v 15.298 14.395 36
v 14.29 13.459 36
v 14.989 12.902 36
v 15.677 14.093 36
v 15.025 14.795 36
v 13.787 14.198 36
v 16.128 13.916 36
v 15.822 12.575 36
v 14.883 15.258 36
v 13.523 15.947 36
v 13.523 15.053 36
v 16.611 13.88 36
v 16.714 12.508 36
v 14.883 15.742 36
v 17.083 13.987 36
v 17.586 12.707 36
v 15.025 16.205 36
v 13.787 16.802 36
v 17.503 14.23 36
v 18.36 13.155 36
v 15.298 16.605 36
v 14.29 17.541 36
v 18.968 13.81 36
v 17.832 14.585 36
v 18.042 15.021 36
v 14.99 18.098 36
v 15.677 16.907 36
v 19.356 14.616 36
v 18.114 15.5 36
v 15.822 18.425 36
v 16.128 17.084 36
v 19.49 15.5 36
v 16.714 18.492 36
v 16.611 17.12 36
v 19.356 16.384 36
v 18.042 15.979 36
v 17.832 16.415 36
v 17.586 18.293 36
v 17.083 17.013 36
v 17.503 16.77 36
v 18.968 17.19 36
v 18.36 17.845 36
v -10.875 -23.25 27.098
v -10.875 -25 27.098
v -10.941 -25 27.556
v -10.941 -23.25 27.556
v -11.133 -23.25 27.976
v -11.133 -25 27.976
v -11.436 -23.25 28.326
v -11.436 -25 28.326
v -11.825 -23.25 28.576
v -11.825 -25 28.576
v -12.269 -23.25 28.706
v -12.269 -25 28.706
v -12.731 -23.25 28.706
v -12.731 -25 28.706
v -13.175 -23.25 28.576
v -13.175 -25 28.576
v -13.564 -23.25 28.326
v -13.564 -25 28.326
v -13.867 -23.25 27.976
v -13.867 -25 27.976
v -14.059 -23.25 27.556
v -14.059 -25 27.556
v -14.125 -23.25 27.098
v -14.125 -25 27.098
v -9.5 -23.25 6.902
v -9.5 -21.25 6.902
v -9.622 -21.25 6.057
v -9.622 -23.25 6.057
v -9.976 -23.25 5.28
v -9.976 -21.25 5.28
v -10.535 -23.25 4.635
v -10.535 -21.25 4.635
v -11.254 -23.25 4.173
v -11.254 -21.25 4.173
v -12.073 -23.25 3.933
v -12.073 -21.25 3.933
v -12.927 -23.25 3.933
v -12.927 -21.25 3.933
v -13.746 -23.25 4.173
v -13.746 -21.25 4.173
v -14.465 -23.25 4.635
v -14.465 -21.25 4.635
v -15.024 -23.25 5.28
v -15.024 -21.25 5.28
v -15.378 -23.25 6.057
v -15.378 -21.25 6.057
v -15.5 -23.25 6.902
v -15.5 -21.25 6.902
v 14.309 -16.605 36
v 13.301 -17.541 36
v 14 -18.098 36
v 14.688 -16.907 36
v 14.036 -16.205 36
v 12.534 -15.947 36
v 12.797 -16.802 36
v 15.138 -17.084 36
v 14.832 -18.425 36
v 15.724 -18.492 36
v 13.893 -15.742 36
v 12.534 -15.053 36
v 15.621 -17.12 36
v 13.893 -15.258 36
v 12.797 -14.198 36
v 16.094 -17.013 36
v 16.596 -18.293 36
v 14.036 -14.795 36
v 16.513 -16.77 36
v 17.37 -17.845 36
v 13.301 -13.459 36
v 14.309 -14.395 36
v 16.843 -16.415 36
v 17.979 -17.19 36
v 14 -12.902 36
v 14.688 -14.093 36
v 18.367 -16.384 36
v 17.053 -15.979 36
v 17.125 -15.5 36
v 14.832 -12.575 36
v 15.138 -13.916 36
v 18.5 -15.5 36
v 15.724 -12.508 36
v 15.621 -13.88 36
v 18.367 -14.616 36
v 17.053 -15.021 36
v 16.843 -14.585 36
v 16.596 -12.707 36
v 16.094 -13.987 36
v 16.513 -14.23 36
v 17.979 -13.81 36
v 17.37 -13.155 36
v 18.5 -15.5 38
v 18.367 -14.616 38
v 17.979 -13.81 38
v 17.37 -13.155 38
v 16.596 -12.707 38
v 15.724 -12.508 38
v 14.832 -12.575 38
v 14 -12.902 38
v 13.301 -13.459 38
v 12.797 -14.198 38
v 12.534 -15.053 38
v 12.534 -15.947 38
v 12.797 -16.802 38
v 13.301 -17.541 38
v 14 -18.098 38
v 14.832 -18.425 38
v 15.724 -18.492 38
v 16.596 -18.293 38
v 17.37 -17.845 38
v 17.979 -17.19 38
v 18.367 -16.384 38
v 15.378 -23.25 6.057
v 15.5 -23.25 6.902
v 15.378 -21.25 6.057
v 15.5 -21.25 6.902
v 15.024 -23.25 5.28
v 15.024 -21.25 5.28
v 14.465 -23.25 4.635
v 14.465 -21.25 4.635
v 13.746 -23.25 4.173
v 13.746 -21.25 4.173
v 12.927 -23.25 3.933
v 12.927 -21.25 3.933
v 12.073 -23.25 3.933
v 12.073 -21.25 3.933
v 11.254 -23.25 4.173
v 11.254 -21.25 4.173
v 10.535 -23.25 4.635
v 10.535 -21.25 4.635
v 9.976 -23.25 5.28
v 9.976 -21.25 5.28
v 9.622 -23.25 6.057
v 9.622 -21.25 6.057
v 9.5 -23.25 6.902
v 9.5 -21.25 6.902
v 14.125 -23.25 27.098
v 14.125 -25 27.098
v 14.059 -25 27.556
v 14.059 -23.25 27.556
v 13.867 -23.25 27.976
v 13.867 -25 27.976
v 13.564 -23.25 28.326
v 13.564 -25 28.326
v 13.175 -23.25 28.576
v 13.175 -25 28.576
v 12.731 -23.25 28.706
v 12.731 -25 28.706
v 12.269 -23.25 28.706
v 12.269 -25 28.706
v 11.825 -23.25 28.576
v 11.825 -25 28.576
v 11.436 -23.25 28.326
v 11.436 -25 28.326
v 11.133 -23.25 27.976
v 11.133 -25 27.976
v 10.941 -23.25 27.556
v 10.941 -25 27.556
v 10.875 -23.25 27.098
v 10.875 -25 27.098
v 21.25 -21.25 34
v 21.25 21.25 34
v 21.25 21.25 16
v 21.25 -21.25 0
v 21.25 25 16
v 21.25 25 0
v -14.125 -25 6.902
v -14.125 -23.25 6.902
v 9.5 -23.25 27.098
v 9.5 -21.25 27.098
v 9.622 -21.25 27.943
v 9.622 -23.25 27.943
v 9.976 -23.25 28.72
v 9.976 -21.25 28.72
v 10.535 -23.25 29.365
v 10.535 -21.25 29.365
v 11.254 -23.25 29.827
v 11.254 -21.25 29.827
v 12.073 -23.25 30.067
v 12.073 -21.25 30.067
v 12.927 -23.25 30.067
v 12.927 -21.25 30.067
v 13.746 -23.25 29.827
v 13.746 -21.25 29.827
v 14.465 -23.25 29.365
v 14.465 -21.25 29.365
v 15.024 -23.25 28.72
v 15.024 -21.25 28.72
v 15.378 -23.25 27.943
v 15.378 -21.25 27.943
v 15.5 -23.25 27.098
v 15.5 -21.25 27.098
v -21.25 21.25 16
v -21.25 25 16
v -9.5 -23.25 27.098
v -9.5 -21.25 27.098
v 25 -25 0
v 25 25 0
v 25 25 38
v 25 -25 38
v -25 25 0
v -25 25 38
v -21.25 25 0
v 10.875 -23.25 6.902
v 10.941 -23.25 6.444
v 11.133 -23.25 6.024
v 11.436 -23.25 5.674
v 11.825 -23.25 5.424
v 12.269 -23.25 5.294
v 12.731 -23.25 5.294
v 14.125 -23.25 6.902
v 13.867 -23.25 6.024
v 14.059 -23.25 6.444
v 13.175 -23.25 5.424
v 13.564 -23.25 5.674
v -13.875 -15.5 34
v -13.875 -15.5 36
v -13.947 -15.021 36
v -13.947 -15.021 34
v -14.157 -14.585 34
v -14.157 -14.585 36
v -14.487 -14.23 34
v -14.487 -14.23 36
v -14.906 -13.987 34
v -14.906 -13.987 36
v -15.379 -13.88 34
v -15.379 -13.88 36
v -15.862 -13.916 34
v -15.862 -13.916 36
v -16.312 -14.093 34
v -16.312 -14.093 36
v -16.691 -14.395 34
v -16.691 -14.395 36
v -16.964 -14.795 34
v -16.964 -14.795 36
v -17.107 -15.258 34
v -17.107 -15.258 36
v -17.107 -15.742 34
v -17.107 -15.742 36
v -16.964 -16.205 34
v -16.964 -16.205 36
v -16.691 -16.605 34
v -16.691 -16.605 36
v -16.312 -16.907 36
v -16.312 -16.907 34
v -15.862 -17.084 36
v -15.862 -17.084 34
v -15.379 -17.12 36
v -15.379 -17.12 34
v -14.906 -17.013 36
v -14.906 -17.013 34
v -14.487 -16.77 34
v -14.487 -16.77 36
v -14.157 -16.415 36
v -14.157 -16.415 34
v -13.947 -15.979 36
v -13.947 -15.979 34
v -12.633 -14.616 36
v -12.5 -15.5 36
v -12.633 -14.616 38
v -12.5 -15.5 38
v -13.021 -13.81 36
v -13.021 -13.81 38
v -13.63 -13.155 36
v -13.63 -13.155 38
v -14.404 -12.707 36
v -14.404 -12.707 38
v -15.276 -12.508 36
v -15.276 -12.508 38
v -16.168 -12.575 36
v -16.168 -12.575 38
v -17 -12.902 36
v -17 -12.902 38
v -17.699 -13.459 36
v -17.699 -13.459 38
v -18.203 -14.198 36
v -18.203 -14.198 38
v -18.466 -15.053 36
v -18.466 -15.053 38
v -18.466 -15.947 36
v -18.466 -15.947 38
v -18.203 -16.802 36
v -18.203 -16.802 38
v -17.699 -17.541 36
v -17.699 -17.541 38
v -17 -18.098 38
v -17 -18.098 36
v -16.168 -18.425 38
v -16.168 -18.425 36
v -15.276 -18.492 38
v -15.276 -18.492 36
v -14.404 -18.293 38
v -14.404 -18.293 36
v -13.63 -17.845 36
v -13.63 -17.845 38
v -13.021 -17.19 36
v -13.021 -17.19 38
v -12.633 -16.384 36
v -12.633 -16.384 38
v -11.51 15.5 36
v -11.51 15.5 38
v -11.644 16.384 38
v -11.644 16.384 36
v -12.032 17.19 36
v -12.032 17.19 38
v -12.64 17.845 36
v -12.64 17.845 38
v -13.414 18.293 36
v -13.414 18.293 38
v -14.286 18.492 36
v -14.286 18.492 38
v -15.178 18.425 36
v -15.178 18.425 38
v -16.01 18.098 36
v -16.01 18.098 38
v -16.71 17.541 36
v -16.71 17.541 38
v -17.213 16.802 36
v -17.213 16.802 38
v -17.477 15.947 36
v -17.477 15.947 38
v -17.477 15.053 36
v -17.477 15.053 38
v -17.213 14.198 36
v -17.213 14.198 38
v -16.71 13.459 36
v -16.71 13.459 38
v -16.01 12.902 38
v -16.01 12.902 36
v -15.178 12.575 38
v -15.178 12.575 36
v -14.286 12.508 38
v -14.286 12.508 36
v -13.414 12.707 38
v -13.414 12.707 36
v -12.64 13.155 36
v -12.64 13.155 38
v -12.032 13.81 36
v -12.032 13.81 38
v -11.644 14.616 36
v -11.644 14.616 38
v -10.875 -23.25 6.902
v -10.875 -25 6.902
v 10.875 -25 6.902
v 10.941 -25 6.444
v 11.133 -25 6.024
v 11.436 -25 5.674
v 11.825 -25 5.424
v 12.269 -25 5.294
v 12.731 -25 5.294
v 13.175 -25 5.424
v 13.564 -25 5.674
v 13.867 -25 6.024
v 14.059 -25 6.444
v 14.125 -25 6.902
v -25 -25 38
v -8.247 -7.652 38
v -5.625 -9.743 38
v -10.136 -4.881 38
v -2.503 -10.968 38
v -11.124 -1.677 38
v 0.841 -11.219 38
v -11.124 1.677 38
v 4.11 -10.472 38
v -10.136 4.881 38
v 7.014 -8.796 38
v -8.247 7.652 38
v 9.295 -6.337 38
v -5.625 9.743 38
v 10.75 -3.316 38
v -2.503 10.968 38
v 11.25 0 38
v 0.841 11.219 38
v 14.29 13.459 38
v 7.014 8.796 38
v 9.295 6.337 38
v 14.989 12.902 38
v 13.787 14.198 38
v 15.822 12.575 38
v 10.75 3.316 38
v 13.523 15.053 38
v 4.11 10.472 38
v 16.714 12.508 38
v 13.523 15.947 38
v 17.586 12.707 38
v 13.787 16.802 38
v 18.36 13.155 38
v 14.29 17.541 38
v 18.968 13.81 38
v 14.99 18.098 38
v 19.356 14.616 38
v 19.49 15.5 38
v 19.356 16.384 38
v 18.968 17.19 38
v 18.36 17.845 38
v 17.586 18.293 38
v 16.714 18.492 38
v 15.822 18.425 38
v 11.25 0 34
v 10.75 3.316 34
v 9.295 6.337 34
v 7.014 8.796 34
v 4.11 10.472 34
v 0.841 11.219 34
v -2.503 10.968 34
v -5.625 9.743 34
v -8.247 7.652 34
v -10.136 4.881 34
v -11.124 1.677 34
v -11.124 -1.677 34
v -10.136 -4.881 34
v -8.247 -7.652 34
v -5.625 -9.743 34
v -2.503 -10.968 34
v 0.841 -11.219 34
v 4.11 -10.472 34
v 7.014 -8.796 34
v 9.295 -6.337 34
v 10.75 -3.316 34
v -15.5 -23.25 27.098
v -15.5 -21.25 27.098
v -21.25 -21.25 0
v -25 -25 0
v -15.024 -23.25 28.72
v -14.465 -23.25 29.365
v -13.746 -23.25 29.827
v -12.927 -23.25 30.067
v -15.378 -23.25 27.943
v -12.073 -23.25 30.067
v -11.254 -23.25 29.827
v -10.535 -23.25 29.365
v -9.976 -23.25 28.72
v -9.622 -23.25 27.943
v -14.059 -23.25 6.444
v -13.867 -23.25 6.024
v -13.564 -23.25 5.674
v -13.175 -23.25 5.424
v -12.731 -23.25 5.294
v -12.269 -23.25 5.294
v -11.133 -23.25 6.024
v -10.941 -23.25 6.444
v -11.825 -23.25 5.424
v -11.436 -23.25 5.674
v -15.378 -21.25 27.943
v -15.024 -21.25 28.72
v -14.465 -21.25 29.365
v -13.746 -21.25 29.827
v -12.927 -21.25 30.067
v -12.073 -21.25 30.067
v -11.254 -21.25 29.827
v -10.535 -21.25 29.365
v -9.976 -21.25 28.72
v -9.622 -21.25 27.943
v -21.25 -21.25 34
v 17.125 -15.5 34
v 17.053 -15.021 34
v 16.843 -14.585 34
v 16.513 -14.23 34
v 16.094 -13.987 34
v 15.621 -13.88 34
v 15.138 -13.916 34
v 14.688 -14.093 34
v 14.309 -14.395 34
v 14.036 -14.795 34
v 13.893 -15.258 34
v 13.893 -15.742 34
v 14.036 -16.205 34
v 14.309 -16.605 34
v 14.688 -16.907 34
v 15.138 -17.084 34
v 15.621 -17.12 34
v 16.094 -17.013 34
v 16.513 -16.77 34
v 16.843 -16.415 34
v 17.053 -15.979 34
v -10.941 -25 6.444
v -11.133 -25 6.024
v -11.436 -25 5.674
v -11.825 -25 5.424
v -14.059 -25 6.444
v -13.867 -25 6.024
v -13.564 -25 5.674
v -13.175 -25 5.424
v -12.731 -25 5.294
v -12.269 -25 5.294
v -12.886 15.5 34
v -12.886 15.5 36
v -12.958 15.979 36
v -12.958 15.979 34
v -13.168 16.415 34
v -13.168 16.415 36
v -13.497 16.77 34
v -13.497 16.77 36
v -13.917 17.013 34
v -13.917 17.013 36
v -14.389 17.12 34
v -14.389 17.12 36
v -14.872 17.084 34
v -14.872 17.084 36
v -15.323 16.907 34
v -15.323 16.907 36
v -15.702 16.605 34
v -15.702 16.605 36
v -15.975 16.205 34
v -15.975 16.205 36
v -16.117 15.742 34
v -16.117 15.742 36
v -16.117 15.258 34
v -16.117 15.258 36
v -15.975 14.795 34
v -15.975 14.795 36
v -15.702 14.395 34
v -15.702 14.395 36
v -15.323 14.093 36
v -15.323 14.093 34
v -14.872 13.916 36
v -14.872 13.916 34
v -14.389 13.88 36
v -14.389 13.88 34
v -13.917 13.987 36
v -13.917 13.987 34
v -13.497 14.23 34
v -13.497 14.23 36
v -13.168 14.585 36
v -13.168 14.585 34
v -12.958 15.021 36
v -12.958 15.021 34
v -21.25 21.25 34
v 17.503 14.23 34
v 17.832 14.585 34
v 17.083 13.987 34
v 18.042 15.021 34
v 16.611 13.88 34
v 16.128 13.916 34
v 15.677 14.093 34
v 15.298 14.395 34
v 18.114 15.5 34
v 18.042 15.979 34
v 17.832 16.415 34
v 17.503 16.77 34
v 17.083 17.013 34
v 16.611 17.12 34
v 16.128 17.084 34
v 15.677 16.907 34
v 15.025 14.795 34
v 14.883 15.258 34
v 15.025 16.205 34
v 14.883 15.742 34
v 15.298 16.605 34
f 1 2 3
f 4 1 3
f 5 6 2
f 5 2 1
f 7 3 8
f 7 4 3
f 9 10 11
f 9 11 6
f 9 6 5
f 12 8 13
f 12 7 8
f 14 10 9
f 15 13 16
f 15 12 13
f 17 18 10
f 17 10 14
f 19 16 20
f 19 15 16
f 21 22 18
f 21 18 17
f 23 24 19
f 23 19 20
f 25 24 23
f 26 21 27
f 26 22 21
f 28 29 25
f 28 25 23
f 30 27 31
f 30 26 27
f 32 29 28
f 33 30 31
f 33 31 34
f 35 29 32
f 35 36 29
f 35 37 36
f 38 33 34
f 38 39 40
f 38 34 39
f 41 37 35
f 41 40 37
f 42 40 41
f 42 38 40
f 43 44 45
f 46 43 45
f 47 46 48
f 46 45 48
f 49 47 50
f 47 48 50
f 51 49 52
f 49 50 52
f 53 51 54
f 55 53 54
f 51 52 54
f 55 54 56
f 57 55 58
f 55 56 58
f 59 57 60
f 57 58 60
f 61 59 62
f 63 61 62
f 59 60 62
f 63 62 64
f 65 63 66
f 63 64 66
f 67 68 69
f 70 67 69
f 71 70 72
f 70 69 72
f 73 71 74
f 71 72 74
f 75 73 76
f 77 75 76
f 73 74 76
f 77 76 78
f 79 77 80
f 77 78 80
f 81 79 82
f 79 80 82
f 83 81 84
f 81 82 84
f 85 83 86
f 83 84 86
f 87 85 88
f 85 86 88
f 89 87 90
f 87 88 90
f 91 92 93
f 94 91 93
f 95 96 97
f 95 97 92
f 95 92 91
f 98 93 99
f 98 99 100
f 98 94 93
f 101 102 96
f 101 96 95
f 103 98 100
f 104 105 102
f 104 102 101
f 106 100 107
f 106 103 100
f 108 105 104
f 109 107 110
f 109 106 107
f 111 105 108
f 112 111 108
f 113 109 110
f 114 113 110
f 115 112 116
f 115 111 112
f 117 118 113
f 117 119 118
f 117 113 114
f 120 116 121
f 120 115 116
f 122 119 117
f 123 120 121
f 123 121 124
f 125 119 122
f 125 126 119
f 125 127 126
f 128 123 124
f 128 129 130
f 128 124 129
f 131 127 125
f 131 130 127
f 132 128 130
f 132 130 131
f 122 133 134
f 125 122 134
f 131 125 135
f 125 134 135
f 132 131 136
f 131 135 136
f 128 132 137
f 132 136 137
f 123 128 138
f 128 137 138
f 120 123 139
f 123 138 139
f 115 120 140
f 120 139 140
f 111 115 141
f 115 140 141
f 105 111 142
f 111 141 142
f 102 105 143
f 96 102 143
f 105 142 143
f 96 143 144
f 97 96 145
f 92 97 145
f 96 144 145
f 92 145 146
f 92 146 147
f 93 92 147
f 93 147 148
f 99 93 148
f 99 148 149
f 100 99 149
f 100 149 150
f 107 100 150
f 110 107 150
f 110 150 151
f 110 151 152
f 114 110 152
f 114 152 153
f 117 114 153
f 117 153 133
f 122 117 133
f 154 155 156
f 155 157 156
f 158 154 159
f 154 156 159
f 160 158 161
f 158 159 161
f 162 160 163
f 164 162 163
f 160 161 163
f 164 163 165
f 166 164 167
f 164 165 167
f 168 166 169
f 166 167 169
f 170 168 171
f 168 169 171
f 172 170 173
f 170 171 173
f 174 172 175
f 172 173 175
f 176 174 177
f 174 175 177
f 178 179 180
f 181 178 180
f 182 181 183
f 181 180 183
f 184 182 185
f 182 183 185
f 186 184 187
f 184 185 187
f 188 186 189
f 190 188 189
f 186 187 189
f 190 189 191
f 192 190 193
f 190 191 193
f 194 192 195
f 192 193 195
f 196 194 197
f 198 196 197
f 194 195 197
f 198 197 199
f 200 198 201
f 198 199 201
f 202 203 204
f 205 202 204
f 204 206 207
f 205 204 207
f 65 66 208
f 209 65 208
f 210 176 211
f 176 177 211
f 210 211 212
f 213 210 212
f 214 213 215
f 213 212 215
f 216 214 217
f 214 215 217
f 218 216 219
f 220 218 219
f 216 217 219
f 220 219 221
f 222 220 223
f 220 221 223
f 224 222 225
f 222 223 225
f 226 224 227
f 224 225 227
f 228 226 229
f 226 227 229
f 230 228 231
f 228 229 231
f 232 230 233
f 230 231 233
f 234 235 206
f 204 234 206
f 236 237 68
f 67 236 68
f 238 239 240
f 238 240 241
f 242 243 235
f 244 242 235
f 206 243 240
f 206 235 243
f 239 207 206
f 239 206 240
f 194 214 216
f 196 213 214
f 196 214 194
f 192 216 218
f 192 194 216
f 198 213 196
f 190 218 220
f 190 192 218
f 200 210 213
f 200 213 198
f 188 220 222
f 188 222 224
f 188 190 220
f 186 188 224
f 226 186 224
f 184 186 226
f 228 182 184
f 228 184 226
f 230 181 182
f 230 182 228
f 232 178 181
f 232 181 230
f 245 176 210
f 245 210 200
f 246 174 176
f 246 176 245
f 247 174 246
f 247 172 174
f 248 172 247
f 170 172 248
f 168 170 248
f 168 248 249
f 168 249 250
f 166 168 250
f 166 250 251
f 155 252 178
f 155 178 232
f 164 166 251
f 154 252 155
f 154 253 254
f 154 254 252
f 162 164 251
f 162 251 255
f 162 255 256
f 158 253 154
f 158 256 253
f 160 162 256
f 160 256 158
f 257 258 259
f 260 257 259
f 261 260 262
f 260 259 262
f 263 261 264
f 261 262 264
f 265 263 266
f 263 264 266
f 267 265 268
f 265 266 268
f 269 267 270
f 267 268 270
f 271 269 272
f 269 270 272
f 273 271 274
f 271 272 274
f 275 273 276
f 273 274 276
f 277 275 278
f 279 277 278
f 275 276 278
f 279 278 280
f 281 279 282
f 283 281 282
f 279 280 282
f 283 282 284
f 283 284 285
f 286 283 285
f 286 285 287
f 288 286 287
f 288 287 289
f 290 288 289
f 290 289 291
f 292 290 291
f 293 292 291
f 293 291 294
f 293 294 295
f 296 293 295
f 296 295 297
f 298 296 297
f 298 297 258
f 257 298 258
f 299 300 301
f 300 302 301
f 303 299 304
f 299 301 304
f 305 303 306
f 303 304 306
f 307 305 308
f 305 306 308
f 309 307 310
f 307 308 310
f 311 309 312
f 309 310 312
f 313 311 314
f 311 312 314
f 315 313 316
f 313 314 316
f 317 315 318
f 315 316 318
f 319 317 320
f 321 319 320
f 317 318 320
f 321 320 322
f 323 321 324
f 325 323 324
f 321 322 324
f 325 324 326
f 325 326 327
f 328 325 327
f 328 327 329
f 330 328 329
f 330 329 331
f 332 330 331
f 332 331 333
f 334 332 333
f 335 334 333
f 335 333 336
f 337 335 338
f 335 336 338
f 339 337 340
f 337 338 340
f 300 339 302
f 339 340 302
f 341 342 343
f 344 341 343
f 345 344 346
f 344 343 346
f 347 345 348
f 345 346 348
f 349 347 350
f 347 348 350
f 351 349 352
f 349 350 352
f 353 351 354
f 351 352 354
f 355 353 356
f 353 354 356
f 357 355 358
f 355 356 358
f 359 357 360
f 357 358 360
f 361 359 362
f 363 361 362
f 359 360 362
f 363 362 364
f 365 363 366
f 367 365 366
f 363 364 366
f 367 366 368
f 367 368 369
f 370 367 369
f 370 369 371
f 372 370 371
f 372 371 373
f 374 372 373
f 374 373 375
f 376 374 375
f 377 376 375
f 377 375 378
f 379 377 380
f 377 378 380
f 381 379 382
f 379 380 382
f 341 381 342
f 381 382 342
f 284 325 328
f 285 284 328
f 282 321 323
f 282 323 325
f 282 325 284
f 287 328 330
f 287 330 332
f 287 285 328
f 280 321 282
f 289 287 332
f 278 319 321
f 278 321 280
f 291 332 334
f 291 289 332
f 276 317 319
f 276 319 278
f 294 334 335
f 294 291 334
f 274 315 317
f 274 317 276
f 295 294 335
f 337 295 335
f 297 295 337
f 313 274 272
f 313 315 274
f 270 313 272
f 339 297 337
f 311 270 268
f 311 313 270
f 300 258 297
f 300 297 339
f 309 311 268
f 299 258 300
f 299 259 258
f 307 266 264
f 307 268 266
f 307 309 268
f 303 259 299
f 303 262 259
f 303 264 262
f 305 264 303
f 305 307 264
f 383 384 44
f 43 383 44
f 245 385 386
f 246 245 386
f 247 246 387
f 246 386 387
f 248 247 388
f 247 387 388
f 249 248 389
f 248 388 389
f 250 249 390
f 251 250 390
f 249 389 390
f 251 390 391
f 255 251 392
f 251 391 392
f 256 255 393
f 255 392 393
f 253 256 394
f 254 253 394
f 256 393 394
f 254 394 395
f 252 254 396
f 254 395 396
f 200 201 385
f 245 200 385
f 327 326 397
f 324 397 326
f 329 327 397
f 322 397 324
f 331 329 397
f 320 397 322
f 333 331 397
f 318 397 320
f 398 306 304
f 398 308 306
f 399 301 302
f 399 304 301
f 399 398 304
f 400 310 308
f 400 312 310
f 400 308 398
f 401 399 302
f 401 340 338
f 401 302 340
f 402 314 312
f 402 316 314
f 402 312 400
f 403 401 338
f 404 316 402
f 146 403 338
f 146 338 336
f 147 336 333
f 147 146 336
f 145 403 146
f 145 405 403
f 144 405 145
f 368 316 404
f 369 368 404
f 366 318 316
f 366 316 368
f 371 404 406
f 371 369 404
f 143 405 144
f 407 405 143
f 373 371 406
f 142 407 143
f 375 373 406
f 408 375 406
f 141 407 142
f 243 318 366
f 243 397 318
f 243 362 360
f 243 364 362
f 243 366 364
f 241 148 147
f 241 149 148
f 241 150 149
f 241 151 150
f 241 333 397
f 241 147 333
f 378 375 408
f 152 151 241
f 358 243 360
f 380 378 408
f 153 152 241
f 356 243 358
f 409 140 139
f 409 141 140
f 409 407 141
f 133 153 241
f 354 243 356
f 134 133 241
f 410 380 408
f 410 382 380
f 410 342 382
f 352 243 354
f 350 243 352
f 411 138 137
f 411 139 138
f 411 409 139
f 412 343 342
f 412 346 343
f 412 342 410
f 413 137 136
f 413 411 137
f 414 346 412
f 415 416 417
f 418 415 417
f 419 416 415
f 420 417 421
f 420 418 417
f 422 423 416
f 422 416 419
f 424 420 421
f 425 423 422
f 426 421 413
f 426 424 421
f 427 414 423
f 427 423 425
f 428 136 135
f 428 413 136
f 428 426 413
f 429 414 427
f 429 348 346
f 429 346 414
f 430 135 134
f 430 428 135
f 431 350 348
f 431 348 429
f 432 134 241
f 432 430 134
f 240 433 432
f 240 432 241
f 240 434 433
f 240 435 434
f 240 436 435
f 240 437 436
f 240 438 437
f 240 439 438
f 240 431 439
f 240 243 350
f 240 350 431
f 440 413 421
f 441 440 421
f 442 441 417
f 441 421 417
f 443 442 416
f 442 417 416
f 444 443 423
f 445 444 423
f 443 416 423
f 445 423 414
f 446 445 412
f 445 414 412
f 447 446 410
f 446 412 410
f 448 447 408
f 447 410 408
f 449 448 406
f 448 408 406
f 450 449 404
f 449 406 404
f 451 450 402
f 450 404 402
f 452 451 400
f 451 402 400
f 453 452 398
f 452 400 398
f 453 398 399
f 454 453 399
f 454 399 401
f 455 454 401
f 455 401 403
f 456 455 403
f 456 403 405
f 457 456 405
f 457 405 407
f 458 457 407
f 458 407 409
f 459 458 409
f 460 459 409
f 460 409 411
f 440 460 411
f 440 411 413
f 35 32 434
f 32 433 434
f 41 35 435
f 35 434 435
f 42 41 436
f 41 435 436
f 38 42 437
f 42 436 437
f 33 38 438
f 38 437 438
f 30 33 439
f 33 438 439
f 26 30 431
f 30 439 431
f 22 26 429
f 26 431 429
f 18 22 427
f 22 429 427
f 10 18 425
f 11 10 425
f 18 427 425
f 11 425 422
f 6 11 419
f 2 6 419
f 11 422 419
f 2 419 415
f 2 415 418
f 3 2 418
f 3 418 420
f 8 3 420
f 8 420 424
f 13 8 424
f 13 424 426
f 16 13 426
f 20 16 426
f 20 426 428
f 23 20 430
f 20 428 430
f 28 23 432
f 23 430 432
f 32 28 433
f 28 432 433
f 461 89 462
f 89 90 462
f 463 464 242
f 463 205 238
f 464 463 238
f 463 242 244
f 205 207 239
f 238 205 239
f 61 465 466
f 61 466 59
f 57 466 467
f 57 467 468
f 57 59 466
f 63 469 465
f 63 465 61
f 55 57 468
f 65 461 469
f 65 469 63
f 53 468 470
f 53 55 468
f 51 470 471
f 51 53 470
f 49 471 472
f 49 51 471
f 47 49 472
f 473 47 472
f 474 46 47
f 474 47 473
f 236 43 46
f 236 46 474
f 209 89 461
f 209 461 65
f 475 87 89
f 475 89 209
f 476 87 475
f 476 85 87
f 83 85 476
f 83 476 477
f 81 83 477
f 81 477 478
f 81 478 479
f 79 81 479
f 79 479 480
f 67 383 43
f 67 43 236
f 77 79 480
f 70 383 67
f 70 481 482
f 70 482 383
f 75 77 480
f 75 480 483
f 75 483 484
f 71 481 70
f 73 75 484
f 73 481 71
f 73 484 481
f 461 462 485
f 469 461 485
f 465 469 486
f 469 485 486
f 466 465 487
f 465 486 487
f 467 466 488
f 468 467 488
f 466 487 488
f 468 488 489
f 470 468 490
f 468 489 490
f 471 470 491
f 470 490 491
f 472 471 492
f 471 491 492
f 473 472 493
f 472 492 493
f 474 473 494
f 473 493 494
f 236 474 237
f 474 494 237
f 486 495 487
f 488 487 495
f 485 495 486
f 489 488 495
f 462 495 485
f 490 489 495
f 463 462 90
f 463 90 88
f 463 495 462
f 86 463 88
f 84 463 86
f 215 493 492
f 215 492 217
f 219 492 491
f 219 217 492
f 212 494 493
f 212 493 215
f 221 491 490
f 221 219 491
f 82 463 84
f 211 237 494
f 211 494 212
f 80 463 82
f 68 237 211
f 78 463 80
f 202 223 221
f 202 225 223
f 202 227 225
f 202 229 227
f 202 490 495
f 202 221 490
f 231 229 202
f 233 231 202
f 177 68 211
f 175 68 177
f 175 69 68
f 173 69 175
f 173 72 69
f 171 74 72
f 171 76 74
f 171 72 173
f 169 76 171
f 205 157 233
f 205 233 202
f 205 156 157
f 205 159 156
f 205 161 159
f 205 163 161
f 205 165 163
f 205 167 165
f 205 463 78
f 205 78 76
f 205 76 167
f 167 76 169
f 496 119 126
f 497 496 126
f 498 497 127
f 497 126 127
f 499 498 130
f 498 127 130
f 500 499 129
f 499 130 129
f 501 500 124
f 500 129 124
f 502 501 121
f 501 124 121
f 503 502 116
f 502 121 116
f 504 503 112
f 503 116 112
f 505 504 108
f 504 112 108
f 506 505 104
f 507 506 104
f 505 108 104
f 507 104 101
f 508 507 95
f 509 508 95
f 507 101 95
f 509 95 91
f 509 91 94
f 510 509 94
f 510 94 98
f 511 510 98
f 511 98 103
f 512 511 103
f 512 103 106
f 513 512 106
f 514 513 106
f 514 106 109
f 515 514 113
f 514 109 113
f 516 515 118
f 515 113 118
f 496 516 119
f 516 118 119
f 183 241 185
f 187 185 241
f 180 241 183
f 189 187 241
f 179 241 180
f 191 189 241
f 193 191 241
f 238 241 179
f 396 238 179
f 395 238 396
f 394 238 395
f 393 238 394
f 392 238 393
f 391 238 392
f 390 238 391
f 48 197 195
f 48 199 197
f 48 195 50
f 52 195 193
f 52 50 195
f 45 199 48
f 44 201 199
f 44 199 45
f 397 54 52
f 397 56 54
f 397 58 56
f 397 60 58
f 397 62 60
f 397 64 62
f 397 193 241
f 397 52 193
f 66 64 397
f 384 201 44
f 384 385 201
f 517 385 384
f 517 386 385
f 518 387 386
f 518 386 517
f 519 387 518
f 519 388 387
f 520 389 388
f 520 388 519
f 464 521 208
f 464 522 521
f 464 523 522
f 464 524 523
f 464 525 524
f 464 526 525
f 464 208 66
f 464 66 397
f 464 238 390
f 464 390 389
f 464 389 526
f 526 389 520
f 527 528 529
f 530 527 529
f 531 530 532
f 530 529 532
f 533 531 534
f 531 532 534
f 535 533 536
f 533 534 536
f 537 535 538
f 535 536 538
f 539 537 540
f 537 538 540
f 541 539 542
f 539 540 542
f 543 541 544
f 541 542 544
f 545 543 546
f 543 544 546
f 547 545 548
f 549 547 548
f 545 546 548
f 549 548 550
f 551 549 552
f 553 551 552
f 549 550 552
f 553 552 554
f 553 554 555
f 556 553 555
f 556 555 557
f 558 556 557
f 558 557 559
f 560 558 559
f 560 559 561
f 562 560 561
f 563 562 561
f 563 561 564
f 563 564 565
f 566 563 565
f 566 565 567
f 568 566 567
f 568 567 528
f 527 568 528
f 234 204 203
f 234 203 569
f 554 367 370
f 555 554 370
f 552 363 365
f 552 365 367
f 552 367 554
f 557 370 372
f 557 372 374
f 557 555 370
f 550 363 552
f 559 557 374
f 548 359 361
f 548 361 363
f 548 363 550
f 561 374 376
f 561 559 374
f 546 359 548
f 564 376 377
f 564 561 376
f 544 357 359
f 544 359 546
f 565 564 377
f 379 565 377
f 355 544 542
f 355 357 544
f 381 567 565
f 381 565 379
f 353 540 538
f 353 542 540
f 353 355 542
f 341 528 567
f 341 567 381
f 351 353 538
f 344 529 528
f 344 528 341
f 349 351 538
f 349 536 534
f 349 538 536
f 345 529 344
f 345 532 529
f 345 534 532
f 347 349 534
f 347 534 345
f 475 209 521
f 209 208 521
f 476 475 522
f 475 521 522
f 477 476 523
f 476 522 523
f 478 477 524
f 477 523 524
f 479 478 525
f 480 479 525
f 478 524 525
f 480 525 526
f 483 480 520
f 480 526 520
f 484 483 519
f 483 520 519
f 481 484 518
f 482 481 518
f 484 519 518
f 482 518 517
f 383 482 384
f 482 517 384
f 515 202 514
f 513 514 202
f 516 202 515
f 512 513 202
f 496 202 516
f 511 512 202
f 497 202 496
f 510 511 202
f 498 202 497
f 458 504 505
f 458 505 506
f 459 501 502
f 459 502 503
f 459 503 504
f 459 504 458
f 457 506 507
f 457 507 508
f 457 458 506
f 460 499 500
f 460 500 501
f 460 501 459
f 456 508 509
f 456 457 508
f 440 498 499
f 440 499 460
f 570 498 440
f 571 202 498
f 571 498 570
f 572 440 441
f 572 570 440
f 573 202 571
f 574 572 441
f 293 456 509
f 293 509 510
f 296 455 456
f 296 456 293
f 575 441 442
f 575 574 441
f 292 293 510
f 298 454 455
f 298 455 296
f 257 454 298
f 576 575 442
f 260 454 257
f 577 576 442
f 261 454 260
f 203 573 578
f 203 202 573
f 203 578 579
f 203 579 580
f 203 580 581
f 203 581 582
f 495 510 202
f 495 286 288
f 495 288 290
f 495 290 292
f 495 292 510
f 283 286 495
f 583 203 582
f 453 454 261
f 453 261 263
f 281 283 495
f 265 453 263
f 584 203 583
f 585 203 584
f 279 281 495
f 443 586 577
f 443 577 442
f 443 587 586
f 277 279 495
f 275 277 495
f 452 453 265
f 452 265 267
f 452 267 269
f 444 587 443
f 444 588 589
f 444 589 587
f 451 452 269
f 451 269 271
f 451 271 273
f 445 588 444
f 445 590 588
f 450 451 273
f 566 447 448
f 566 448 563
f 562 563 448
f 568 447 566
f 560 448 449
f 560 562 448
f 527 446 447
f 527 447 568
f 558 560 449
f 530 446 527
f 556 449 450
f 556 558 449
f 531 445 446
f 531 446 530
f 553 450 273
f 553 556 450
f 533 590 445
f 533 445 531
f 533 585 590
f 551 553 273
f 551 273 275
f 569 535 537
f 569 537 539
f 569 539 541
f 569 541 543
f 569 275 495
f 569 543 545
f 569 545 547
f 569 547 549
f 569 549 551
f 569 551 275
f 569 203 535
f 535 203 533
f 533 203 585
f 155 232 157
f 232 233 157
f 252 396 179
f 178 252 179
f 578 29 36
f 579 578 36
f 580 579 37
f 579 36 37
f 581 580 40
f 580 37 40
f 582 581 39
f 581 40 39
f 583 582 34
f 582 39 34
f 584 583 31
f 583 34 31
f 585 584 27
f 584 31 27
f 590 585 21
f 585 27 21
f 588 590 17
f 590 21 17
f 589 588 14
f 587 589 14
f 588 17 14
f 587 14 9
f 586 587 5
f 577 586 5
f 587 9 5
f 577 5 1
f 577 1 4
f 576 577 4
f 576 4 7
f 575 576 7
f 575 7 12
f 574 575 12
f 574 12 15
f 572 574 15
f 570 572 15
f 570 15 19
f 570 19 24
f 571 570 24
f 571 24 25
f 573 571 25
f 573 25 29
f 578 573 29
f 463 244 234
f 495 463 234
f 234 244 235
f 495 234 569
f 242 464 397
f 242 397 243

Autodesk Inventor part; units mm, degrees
ref_plane "YZ Plane" through (0, 0, 0) normal (1, 0, 0) x (0, 1, 0)
ref_plane "XZ Plane" through (0, 0, 0) normal (0, 1, 0) x (-1, 0, 0)
ref_plane "XY Plane" through (0, 0, 0) normal (0, 0, 1) x (1, 0, 0)
sketch "Sketch1" plane through (0, 0, 0) normal (0, 0, 1) x (1, 0, 0)
  point P0 (0, 0)
sketch "Sketch2" plane through (0, 0, 0) normal (0, 0, 1) x (1, 0, 0)
  line L0 (-25, 25) -> (25, 25)
  line L1 (25, 25) -> (25, -25)
  line L2 (25, -25) -> (-25, -25)
  line L3 (-25, -25) -> (-25, 25)
  point P0 (0, 0)
  dimension "d0" = 50
  dimension "d1" = 50
  dimension "d2" = 25
  dimension "d3" = 25
extrude "Extrusion1" add sketch "Sketch2" along normal blind 38
sketch "Sketch3" plane through (0, 0, 0) normal (0, 0, -1) x (-1, 0, 0)
  point P0 (0, 0)
sketch "Sketch4" plane through (-25, 25, 0) normal (0, 1, 0) x (1, 0, 0)
  line L0 (0, 0) -> (50, 0) projected
  line L1 (46.25, 0) -> (3.75, 0)
  line L2 (3.75, 0) -> (3.75, -16)
  line L3 (3.75, -16) -> (46.25, -16)
  line L4 (46.25, -16) -> (46.25, 0)
  line L5 (50, 0) -> (50, -38) projected
  point P0 (25, 0)
  dimension "d6" = 42.5
  dimension "d7" = 16
  dimension "d8" = 3.75
extrude "Extrusion2" cut sketch "Sketch4" against normal blind 46.25
sketch "Sketch5" plane through (21.25, 25, 16) normal (0, 0, -1) x (-1, 0, 0)
  line L0 (0, -46.25) -> (0, 0) projected
  line L1 (42.5, 0) -> (42.5, -46.25) projected
  line L2 (0, -3.75) -> (42.5, -3.75)
  line L3 (42.5, -3.75) -> (42.5, -46.25)
  line L4 (42.5, -46.25) -> (0, -46.25)
  line L5 (0, -46.25) -> (0, -3.75)
  line L6 (-3.75, 0) -> (46.25, 0) projected
  point P0 (21.25, -25)
  dimension "d11" = 3.75
extrude "Extrusion3" cut sketch "Sketch5" against normal blind 18 contours L0 L2 L1 L4
sketch "Sketch6" plane through (-25, -25, 0) normal (-1, 0, 0) x (0, 0, 1)
  point P0 (0, 25)
sketch "Sketch7" plane through (0, 0, 38) normal (0, 0, 1) x (1, 0, 0)
  circle A0 centre (0, 0) radius 11.25
  dimension "d14" = 22.5
extrude "Extrusion4" cut sketch "Sketch7" against normal blind 6
sketch "Sketch8" plane through (0, 0, 38) normal (0, 0, 1) x (1, 0, 0)
  circle A0 centre (-14.5105, 15.5) radius 1.625
  circle A1 centre (16.4895, 15.5) radius 1.625
  circle A2 centre (15.5, -15.5) radius 1.625
  circle A3 centre (-15.5, -15.5) radius 1.625
  point P0 (0, 0)
  dimension "d17" = 3.25
  dimension "d18" = 3.25
  dimension "d19" = 3.25
  dimension "d20" = 3.25
  dimension "d21" = 15.5
  dimension "d22" = 31
  dimension "d23" = 31
  dimension "d24" = 15.5
  dimension "d25" = 31
  dimension "d26" = 15.5
  dimension "d27" = 15.5
extrude "Extrusion5" cut sketch "Sketch8" against normal blind 4
sketch "Sketch9" plane through (-25, -21.25, 0) normal (0, 1, 0) x (1, 0, 0)
  point P0 (25, 0)
sketch "Sketch10" plane through (-25, -25, 0) normal (0, -1, 0) x (1, 0, 0)
  line L0 (37.5, 6.9021) -> (37.5, 27.0979) construction
  line L1 (46.25, 34) -> (3.75, 34) projected
  line L2 (39.125, 6.9021) -> (39.125, 27.0979)
  line L3 (35.875, 27.0979) -> (35.875, 6.9021)
  arc A0 (35.875, 6.9021) -> (39.125, 6.9021) centre (37.5, 6.9021) ccw
  arc A1 (39.125, 27.0979) -> (35.875, 27.0979) centre (37.5, 27.0979) ccw
  line L4 (12.5, 6.9021) -> (12.5, 27.0979) construction
  line L5 (14.125, 6.9021) -> (14.125, 27.0979)
  line L6 (10.875, 27.0979) -> (10.875, 6.9021)
  arc A2 (10.875, 6.9021) -> (14.125, 6.9021) centre (12.5, 6.9021) ccw
  arc A3 (14.125, 27.0979) -> (10.875, 27.0979) centre (12.5, 27.0979) ccw
  line L7 (50, 0) -> (0, 0) projected
  line L8 (0, 0) -> (0, 38) projected
  point P0 (25, 0)
  point P1 (37.5, 17)
  point P2 (12.5, 17)
  dimension "d30" = 3.25
  dimension "d31" = 3.25
  dimension "d32" = 17
  dimension "d33" = 17
  dimension "d34" = 25
  dimension "d35" = 12.5
extrude "Extrusion6" cut sketch "Sketch10" against normal blind 4
sketch "Sketch11" plane through (0, 0, 38) normal (0, 0, 1) x (1, 0, 0)
  point P0 (0, 0)
sketch "Sketch12" plane through (0, 0, 38) normal (0, 0, 1) x (1, 0, 0)
  circle A0 centre (-14.5105, 15.5) radius 1.625 projected
  circle A1 centre (-14.5105, 15.5) radius 3
  circle A2 centre (16.4895, 15.5) radius 1.625 projected
  circle A3 centre (16.4895, 15.5) radius 3
  circle A4 centre (-15.5, -15.5) radius 1.625 projected
  circle A5 centre (-15.5, -15.5) radius 3
  circle A6 centre (15.5, -15.5) radius 1.625 projected
  circle A7 centre (15.5, -15.5) radius 3
  point P0 (0, 0)
  dimension "d38" = 6
  dimension "d39" = 6
  dimension "d40" = 6
  dimension "d41" = 6
extrude "Extrusion7" cut sketch "Sketch12" against normal blind 2
sketch "Sketch13" plane through (-25, -21.25, 0) normal (0, 1, 0) x (1, 0, 0)
  arc A0 (10.875, -27.0979) -> (14.125, -27.0979) centre (12.5, -27.0979) ccw projected
  arc A1 (14.125, -6.9021) -> (10.875, -6.9021) centre (12.5, -6.9021) ccw projected
  line L0 (12.5, -27.0979) -> (12.5, -6.9021) construction
  line L1 (15.5, -27.0979) -> (15.5, -6.9021)
  line L2 (9.5, -6.9021) -> (9.5, -27.0979)
  arc A2 (9.5, -27.0979) -> (15.5, -27.0979) centre (12.5, -27.0979) ccw
  arc A3 (15.5, -6.9021) -> (9.5, -6.9021) centre (12.5, -6.9021) ccw
  arc A4 (35.875, -27.0979) -> (39.125, -27.0979) centre (37.5, -27.0979) ccw projected
  arc A5 (39.125, -6.9021) -> (35.875, -6.9021) centre (37.5, -6.9021) ccw projected
  line L3 (37.5, -27.0979) -> (37.5, -6.9021) construction
  line L4 (40.5, -27.0979) -> (40.5, -6.9021)
  line L5 (34.5, -6.9021) -> (34.5, -27.0979)
  arc A6 (34.5, -27.0979) -> (40.5, -27.0979) centre (37.5, -27.0979) ccw
  arc A7 (40.5, -6.9021) -> (34.5, -6.9021) centre (37.5, -6.9021) ccw
  point P0 (25, 0)
  point P1 (12.5, -17)
  point P2 (37.5, -17)
  dimension "d44" = 6
  dimension "d45" = 6
extrude "Extrusion8" cut sketch "Sketch13" against normal blind 2
sketch "Sketch14" plane through (0, 0, 38) normal (0, 0, 1) x (1, 0, 0)
  line L0 (0, 0) -> (0, -25)
  line L1 (25, -25) -> (-25, -25) projected
properties part number "stepperMount"
